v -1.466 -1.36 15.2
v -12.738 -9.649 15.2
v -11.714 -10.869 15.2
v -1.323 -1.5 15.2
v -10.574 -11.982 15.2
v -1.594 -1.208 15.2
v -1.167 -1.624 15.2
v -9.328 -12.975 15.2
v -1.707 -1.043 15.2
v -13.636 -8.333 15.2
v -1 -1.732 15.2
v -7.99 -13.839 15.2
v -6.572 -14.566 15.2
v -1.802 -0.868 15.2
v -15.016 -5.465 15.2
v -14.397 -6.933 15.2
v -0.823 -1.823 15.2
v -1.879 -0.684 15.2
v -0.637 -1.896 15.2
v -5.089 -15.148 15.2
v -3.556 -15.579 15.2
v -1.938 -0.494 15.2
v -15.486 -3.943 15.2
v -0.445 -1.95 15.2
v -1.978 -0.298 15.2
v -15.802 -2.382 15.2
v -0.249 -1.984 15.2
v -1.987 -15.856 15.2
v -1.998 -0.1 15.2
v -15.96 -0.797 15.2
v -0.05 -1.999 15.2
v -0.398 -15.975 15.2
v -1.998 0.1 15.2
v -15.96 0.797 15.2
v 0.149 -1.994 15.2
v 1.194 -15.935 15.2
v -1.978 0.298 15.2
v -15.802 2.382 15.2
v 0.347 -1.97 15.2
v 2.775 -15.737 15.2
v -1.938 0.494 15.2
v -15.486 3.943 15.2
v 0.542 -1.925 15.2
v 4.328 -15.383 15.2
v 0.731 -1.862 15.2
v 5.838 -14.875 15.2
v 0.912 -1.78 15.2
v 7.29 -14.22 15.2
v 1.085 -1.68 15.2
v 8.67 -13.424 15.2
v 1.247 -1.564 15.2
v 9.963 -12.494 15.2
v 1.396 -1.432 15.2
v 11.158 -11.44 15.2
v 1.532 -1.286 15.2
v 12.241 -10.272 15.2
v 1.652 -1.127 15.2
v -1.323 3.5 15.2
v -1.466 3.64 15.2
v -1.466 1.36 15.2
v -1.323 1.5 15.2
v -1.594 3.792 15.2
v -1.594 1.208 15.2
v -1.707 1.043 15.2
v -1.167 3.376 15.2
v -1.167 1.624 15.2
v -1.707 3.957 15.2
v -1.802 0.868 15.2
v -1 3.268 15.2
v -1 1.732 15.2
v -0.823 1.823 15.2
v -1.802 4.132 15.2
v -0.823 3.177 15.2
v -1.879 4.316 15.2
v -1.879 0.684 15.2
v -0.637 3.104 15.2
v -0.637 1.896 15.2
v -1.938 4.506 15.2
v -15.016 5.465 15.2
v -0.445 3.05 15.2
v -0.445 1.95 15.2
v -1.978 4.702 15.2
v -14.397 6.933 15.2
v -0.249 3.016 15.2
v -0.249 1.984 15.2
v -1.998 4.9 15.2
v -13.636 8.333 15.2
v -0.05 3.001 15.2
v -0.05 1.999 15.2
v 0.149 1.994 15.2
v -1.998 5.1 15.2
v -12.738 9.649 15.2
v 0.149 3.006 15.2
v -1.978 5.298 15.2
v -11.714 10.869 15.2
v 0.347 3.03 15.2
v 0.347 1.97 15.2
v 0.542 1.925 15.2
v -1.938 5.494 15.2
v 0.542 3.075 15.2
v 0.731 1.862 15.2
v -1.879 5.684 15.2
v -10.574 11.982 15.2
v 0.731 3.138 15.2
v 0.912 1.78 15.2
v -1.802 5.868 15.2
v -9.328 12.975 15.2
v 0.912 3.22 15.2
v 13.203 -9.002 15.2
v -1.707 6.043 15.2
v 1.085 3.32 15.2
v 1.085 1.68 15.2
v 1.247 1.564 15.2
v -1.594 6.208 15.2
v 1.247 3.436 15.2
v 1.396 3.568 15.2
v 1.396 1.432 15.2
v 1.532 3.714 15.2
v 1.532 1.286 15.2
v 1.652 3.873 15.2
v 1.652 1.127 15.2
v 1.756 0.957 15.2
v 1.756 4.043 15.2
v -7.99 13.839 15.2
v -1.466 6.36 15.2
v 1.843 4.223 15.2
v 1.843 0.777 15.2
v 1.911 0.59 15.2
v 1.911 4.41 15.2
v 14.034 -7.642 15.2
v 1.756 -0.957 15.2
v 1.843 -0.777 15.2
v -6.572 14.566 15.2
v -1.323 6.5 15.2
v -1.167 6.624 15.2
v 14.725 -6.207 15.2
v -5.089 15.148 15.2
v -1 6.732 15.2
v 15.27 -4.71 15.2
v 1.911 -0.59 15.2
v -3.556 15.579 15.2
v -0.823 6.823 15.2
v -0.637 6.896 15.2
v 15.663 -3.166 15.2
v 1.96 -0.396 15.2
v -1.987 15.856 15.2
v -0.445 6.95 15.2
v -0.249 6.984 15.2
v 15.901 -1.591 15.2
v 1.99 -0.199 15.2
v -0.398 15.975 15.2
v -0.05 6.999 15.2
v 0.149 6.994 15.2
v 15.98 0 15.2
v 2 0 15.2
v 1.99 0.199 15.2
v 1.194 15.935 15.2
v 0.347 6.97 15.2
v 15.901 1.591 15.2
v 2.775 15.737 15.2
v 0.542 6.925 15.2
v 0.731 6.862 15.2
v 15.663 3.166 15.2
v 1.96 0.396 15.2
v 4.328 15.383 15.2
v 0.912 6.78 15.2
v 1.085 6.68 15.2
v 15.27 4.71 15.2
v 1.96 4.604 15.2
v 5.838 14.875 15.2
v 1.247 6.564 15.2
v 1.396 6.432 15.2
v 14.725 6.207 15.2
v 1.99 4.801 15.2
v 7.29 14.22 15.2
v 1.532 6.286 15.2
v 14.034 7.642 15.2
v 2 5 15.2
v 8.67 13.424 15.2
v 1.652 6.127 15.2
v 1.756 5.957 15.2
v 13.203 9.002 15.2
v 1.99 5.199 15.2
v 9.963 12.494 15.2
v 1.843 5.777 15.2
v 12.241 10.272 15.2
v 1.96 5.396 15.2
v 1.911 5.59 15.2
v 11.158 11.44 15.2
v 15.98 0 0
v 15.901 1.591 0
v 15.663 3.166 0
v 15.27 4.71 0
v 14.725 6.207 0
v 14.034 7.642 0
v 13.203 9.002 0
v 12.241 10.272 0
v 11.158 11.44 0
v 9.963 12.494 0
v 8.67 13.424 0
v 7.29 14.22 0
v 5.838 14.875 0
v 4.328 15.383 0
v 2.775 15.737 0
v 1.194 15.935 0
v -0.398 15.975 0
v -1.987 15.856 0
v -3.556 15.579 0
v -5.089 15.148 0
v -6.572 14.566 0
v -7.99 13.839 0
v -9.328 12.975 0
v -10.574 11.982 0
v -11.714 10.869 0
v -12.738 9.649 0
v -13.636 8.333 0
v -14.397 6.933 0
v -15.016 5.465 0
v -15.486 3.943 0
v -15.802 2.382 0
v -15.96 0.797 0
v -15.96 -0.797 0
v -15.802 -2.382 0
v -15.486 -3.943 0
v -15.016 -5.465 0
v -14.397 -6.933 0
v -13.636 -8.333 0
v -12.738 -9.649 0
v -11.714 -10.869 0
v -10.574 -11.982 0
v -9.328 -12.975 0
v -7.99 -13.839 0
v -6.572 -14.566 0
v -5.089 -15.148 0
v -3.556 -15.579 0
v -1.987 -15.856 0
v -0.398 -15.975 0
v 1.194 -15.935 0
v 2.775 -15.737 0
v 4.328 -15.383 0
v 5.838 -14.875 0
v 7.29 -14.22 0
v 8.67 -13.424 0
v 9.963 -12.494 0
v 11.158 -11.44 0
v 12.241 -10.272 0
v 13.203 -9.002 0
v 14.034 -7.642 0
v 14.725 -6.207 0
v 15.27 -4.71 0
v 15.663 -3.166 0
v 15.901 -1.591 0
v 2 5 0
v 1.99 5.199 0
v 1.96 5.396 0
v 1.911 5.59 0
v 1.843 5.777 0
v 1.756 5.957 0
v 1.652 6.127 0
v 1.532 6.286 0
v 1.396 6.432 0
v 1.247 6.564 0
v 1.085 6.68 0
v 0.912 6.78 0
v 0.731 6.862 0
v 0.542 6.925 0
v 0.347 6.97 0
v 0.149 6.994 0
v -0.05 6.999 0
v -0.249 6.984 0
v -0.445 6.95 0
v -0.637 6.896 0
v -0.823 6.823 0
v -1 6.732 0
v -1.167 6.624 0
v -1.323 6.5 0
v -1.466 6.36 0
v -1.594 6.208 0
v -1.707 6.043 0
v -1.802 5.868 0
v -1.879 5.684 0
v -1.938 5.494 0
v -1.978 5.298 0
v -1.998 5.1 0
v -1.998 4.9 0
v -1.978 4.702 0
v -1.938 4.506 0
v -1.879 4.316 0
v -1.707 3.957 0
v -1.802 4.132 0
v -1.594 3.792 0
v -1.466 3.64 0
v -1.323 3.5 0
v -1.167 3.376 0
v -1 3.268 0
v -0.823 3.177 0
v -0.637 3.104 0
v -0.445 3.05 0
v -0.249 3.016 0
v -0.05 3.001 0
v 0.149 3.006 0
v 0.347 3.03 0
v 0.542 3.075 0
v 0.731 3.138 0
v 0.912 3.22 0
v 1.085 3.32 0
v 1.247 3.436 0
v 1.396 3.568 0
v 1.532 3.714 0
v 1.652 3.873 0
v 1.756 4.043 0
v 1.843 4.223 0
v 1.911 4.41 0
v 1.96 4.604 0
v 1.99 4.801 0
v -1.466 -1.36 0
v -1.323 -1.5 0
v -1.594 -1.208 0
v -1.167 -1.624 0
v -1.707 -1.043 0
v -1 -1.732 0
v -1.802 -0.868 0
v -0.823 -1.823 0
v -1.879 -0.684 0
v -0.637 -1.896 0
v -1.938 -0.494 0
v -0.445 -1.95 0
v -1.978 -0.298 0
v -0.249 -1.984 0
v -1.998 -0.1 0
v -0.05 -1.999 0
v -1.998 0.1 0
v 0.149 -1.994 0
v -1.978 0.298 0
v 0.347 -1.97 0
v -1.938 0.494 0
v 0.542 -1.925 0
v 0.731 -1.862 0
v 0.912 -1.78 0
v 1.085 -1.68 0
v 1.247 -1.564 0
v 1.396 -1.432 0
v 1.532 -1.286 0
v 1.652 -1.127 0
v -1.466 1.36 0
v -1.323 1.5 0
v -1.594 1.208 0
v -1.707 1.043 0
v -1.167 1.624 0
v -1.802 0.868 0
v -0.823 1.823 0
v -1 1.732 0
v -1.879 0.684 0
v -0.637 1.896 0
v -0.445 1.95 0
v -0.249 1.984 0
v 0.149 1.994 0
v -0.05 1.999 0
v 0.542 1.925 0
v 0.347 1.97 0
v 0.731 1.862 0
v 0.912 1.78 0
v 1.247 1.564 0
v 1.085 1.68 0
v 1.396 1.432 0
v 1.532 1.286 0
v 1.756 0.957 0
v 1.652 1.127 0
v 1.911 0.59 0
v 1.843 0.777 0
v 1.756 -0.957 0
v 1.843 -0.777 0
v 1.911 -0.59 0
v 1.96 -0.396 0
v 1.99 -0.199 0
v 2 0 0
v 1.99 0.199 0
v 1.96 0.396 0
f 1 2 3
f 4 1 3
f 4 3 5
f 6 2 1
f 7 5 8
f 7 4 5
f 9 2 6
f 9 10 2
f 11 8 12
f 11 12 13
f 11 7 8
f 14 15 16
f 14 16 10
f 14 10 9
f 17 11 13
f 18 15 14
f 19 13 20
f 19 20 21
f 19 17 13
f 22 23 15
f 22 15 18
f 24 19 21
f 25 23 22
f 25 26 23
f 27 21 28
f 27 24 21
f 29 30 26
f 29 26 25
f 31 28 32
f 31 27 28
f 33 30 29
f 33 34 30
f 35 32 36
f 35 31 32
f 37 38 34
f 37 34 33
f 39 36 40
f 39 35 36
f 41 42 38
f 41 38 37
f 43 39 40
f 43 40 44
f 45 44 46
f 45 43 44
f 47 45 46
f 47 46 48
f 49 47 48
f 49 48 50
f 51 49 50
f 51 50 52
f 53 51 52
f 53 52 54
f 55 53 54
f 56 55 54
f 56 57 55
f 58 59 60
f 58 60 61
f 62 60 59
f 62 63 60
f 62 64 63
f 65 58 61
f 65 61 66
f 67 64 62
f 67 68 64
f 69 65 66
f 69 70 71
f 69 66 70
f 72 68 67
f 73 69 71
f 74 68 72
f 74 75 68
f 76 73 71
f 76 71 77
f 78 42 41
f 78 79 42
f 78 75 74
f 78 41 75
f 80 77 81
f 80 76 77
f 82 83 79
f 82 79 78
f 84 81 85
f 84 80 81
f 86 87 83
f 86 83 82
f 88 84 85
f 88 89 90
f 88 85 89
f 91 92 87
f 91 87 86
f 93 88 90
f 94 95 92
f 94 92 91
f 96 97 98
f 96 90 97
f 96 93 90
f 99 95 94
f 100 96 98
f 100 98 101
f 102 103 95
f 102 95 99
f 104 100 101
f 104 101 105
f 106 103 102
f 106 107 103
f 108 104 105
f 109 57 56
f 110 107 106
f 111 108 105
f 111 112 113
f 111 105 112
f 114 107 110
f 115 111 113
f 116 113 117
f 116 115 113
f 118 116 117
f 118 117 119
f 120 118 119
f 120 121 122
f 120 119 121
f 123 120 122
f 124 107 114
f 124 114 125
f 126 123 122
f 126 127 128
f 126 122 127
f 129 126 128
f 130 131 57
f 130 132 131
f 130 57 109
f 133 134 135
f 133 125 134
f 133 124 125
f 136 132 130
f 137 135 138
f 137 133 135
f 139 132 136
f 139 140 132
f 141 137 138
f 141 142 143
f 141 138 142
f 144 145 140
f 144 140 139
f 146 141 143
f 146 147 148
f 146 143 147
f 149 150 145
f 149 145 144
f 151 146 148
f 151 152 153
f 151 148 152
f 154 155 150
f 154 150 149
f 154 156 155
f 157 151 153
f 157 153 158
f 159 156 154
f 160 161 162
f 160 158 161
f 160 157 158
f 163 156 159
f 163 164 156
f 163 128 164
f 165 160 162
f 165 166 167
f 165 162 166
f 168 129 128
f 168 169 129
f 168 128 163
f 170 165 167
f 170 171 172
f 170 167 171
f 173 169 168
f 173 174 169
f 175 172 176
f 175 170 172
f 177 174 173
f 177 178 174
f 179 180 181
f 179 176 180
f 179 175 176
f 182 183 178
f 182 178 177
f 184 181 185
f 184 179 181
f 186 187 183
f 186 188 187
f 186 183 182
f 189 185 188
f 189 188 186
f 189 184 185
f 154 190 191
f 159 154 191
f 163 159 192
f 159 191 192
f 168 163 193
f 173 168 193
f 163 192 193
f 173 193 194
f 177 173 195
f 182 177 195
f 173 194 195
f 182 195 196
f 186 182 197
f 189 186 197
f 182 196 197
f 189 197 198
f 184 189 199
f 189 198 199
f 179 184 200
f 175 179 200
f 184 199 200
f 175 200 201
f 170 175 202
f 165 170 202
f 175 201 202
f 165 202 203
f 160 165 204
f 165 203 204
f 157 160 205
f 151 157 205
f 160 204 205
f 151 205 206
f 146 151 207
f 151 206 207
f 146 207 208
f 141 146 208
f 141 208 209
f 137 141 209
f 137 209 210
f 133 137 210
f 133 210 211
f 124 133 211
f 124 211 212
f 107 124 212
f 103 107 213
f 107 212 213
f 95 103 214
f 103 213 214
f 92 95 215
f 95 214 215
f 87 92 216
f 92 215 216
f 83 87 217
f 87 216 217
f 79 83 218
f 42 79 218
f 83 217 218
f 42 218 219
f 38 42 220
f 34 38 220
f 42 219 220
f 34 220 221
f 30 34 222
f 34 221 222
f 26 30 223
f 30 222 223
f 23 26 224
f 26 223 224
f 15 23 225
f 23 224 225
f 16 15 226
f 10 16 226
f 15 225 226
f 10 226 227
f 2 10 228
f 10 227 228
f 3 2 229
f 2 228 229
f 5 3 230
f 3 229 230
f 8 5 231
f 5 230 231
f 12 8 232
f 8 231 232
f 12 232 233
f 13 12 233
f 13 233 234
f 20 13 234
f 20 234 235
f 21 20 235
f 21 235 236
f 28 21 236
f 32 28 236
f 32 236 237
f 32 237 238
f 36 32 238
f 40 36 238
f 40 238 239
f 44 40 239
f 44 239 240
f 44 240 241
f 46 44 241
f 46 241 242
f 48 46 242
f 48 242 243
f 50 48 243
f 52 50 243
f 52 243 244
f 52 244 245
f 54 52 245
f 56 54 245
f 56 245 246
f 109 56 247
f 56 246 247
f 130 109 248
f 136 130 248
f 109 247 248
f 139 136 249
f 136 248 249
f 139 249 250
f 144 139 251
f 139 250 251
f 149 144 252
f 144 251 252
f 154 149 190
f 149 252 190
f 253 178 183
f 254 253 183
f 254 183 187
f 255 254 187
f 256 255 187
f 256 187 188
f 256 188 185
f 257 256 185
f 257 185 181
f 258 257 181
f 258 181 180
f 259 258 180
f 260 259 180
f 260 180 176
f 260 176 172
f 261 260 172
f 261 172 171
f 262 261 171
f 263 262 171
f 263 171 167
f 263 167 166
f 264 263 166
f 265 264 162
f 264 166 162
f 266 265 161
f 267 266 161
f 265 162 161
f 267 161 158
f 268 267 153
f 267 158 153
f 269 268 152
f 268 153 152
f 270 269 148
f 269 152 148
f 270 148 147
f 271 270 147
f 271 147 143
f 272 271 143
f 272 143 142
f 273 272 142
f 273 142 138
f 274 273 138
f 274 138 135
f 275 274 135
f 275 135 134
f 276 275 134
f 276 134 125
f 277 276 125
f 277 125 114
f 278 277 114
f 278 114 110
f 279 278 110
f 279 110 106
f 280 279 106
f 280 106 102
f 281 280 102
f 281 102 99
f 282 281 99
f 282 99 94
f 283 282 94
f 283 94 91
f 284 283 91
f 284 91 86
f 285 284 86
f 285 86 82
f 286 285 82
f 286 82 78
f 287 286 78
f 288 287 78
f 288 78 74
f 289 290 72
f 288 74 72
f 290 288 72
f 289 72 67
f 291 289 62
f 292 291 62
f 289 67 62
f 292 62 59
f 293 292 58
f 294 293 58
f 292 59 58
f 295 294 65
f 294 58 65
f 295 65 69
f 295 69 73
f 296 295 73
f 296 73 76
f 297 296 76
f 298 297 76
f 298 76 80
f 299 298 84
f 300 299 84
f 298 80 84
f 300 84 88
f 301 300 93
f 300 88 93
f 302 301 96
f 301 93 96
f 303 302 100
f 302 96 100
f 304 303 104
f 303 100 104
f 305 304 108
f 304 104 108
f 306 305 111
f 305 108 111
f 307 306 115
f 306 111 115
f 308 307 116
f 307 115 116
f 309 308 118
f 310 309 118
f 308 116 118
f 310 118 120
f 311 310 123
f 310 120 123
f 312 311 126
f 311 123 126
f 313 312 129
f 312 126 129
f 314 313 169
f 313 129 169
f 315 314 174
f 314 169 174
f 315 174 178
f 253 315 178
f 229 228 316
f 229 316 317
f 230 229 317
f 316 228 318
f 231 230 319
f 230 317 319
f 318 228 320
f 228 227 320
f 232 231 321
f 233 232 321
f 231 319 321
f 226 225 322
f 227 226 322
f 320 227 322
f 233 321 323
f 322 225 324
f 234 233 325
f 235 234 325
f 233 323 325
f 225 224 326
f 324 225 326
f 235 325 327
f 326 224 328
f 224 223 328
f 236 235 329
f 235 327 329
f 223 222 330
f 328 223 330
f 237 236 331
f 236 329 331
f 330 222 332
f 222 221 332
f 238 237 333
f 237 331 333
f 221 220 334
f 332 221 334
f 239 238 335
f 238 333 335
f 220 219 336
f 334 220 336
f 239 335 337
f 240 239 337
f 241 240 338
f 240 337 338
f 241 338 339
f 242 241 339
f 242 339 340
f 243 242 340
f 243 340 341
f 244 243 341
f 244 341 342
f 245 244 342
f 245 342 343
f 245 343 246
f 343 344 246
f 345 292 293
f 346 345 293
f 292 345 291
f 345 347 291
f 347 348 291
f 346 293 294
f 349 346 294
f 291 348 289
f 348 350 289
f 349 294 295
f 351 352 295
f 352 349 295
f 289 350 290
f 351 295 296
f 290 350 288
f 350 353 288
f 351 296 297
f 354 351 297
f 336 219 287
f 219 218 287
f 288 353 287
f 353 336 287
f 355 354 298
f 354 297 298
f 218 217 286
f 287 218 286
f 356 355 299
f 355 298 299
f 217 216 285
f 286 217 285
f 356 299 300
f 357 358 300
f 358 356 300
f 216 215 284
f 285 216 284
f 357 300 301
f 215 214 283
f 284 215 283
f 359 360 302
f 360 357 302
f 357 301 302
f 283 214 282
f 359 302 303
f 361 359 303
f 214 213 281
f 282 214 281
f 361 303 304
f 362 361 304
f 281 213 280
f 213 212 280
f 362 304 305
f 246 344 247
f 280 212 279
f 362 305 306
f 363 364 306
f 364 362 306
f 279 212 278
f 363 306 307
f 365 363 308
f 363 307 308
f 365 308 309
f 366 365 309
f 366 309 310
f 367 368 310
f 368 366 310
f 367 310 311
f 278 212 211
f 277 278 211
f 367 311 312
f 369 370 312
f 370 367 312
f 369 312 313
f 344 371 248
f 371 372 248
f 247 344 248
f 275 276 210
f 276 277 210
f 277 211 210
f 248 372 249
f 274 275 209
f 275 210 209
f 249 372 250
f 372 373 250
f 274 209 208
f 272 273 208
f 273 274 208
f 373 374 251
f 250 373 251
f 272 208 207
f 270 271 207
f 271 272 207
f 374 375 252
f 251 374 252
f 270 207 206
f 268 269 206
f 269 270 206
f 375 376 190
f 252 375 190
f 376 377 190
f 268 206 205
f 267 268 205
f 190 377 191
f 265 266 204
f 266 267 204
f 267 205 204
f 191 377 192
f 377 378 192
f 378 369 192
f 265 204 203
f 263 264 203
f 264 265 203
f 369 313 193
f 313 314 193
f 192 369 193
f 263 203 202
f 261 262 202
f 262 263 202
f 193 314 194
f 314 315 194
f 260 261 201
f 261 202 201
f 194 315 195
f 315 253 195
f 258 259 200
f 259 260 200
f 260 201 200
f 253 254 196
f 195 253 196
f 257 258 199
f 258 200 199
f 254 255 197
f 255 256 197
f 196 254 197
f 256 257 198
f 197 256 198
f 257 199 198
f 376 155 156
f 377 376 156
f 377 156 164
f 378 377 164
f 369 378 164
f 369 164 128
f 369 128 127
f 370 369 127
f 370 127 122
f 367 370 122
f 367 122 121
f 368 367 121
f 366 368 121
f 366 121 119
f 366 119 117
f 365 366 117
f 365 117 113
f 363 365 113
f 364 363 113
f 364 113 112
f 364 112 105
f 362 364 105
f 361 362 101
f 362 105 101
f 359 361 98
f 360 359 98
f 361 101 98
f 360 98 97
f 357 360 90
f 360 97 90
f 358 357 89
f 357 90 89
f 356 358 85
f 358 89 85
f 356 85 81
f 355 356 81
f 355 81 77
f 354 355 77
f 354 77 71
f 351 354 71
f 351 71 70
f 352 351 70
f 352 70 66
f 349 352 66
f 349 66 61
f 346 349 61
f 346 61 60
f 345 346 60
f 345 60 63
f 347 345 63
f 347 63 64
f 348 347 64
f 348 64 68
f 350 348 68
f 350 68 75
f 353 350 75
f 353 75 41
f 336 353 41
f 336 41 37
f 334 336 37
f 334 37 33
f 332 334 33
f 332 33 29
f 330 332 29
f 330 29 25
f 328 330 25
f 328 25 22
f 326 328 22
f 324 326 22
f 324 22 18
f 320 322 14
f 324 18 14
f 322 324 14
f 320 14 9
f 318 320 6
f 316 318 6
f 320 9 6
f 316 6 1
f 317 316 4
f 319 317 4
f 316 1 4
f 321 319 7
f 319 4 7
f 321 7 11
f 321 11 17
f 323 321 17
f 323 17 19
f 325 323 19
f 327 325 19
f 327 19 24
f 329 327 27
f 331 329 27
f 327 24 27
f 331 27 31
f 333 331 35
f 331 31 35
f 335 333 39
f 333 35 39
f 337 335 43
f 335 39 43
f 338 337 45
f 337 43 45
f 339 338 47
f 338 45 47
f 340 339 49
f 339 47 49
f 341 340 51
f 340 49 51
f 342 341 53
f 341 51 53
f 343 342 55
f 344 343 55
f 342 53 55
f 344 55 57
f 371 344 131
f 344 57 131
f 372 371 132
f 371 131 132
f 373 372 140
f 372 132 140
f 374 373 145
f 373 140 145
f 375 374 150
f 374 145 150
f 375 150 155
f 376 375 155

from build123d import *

# Parameters (mm, degrees)
SKETCH1_R      = 15.98
EXTRUDE1_DEPTH = 15.2
SKETCH8_R      = 2
EXTRUDE3_DEPTH = 16.2
SKETCH9_R      = 2
EXTRUDE4_DEPTH = 16.2


with BuildPart() as part:
    # Sketch1 → Extrude1 (new body)
    with BuildSketch(Plane.XY):
        Circle(SKETCH1_R)
    extrude(amount=EXTRUDE1_DEPTH)

    # Sketch8 → Extrude3 (cut, through all)
    with BuildSketch(Plane.XY.offset(15.2)):
        Circle(SKETCH8_R)
    extrude(amount=-EXTRUDE3_DEPTH, mode=Mode.SUBTRACT)

    # Sketch9 → Extrude4 (cut, through all)
    with BuildSketch(Plane.XY.offset(15.2)):
        with Locations((0, 5)):
            Circle(SKETCH9_R)
    extrude(amount=-EXTRUDE4_DEPTH, mode=Mode.SUBTRACT)


solid = part.part
